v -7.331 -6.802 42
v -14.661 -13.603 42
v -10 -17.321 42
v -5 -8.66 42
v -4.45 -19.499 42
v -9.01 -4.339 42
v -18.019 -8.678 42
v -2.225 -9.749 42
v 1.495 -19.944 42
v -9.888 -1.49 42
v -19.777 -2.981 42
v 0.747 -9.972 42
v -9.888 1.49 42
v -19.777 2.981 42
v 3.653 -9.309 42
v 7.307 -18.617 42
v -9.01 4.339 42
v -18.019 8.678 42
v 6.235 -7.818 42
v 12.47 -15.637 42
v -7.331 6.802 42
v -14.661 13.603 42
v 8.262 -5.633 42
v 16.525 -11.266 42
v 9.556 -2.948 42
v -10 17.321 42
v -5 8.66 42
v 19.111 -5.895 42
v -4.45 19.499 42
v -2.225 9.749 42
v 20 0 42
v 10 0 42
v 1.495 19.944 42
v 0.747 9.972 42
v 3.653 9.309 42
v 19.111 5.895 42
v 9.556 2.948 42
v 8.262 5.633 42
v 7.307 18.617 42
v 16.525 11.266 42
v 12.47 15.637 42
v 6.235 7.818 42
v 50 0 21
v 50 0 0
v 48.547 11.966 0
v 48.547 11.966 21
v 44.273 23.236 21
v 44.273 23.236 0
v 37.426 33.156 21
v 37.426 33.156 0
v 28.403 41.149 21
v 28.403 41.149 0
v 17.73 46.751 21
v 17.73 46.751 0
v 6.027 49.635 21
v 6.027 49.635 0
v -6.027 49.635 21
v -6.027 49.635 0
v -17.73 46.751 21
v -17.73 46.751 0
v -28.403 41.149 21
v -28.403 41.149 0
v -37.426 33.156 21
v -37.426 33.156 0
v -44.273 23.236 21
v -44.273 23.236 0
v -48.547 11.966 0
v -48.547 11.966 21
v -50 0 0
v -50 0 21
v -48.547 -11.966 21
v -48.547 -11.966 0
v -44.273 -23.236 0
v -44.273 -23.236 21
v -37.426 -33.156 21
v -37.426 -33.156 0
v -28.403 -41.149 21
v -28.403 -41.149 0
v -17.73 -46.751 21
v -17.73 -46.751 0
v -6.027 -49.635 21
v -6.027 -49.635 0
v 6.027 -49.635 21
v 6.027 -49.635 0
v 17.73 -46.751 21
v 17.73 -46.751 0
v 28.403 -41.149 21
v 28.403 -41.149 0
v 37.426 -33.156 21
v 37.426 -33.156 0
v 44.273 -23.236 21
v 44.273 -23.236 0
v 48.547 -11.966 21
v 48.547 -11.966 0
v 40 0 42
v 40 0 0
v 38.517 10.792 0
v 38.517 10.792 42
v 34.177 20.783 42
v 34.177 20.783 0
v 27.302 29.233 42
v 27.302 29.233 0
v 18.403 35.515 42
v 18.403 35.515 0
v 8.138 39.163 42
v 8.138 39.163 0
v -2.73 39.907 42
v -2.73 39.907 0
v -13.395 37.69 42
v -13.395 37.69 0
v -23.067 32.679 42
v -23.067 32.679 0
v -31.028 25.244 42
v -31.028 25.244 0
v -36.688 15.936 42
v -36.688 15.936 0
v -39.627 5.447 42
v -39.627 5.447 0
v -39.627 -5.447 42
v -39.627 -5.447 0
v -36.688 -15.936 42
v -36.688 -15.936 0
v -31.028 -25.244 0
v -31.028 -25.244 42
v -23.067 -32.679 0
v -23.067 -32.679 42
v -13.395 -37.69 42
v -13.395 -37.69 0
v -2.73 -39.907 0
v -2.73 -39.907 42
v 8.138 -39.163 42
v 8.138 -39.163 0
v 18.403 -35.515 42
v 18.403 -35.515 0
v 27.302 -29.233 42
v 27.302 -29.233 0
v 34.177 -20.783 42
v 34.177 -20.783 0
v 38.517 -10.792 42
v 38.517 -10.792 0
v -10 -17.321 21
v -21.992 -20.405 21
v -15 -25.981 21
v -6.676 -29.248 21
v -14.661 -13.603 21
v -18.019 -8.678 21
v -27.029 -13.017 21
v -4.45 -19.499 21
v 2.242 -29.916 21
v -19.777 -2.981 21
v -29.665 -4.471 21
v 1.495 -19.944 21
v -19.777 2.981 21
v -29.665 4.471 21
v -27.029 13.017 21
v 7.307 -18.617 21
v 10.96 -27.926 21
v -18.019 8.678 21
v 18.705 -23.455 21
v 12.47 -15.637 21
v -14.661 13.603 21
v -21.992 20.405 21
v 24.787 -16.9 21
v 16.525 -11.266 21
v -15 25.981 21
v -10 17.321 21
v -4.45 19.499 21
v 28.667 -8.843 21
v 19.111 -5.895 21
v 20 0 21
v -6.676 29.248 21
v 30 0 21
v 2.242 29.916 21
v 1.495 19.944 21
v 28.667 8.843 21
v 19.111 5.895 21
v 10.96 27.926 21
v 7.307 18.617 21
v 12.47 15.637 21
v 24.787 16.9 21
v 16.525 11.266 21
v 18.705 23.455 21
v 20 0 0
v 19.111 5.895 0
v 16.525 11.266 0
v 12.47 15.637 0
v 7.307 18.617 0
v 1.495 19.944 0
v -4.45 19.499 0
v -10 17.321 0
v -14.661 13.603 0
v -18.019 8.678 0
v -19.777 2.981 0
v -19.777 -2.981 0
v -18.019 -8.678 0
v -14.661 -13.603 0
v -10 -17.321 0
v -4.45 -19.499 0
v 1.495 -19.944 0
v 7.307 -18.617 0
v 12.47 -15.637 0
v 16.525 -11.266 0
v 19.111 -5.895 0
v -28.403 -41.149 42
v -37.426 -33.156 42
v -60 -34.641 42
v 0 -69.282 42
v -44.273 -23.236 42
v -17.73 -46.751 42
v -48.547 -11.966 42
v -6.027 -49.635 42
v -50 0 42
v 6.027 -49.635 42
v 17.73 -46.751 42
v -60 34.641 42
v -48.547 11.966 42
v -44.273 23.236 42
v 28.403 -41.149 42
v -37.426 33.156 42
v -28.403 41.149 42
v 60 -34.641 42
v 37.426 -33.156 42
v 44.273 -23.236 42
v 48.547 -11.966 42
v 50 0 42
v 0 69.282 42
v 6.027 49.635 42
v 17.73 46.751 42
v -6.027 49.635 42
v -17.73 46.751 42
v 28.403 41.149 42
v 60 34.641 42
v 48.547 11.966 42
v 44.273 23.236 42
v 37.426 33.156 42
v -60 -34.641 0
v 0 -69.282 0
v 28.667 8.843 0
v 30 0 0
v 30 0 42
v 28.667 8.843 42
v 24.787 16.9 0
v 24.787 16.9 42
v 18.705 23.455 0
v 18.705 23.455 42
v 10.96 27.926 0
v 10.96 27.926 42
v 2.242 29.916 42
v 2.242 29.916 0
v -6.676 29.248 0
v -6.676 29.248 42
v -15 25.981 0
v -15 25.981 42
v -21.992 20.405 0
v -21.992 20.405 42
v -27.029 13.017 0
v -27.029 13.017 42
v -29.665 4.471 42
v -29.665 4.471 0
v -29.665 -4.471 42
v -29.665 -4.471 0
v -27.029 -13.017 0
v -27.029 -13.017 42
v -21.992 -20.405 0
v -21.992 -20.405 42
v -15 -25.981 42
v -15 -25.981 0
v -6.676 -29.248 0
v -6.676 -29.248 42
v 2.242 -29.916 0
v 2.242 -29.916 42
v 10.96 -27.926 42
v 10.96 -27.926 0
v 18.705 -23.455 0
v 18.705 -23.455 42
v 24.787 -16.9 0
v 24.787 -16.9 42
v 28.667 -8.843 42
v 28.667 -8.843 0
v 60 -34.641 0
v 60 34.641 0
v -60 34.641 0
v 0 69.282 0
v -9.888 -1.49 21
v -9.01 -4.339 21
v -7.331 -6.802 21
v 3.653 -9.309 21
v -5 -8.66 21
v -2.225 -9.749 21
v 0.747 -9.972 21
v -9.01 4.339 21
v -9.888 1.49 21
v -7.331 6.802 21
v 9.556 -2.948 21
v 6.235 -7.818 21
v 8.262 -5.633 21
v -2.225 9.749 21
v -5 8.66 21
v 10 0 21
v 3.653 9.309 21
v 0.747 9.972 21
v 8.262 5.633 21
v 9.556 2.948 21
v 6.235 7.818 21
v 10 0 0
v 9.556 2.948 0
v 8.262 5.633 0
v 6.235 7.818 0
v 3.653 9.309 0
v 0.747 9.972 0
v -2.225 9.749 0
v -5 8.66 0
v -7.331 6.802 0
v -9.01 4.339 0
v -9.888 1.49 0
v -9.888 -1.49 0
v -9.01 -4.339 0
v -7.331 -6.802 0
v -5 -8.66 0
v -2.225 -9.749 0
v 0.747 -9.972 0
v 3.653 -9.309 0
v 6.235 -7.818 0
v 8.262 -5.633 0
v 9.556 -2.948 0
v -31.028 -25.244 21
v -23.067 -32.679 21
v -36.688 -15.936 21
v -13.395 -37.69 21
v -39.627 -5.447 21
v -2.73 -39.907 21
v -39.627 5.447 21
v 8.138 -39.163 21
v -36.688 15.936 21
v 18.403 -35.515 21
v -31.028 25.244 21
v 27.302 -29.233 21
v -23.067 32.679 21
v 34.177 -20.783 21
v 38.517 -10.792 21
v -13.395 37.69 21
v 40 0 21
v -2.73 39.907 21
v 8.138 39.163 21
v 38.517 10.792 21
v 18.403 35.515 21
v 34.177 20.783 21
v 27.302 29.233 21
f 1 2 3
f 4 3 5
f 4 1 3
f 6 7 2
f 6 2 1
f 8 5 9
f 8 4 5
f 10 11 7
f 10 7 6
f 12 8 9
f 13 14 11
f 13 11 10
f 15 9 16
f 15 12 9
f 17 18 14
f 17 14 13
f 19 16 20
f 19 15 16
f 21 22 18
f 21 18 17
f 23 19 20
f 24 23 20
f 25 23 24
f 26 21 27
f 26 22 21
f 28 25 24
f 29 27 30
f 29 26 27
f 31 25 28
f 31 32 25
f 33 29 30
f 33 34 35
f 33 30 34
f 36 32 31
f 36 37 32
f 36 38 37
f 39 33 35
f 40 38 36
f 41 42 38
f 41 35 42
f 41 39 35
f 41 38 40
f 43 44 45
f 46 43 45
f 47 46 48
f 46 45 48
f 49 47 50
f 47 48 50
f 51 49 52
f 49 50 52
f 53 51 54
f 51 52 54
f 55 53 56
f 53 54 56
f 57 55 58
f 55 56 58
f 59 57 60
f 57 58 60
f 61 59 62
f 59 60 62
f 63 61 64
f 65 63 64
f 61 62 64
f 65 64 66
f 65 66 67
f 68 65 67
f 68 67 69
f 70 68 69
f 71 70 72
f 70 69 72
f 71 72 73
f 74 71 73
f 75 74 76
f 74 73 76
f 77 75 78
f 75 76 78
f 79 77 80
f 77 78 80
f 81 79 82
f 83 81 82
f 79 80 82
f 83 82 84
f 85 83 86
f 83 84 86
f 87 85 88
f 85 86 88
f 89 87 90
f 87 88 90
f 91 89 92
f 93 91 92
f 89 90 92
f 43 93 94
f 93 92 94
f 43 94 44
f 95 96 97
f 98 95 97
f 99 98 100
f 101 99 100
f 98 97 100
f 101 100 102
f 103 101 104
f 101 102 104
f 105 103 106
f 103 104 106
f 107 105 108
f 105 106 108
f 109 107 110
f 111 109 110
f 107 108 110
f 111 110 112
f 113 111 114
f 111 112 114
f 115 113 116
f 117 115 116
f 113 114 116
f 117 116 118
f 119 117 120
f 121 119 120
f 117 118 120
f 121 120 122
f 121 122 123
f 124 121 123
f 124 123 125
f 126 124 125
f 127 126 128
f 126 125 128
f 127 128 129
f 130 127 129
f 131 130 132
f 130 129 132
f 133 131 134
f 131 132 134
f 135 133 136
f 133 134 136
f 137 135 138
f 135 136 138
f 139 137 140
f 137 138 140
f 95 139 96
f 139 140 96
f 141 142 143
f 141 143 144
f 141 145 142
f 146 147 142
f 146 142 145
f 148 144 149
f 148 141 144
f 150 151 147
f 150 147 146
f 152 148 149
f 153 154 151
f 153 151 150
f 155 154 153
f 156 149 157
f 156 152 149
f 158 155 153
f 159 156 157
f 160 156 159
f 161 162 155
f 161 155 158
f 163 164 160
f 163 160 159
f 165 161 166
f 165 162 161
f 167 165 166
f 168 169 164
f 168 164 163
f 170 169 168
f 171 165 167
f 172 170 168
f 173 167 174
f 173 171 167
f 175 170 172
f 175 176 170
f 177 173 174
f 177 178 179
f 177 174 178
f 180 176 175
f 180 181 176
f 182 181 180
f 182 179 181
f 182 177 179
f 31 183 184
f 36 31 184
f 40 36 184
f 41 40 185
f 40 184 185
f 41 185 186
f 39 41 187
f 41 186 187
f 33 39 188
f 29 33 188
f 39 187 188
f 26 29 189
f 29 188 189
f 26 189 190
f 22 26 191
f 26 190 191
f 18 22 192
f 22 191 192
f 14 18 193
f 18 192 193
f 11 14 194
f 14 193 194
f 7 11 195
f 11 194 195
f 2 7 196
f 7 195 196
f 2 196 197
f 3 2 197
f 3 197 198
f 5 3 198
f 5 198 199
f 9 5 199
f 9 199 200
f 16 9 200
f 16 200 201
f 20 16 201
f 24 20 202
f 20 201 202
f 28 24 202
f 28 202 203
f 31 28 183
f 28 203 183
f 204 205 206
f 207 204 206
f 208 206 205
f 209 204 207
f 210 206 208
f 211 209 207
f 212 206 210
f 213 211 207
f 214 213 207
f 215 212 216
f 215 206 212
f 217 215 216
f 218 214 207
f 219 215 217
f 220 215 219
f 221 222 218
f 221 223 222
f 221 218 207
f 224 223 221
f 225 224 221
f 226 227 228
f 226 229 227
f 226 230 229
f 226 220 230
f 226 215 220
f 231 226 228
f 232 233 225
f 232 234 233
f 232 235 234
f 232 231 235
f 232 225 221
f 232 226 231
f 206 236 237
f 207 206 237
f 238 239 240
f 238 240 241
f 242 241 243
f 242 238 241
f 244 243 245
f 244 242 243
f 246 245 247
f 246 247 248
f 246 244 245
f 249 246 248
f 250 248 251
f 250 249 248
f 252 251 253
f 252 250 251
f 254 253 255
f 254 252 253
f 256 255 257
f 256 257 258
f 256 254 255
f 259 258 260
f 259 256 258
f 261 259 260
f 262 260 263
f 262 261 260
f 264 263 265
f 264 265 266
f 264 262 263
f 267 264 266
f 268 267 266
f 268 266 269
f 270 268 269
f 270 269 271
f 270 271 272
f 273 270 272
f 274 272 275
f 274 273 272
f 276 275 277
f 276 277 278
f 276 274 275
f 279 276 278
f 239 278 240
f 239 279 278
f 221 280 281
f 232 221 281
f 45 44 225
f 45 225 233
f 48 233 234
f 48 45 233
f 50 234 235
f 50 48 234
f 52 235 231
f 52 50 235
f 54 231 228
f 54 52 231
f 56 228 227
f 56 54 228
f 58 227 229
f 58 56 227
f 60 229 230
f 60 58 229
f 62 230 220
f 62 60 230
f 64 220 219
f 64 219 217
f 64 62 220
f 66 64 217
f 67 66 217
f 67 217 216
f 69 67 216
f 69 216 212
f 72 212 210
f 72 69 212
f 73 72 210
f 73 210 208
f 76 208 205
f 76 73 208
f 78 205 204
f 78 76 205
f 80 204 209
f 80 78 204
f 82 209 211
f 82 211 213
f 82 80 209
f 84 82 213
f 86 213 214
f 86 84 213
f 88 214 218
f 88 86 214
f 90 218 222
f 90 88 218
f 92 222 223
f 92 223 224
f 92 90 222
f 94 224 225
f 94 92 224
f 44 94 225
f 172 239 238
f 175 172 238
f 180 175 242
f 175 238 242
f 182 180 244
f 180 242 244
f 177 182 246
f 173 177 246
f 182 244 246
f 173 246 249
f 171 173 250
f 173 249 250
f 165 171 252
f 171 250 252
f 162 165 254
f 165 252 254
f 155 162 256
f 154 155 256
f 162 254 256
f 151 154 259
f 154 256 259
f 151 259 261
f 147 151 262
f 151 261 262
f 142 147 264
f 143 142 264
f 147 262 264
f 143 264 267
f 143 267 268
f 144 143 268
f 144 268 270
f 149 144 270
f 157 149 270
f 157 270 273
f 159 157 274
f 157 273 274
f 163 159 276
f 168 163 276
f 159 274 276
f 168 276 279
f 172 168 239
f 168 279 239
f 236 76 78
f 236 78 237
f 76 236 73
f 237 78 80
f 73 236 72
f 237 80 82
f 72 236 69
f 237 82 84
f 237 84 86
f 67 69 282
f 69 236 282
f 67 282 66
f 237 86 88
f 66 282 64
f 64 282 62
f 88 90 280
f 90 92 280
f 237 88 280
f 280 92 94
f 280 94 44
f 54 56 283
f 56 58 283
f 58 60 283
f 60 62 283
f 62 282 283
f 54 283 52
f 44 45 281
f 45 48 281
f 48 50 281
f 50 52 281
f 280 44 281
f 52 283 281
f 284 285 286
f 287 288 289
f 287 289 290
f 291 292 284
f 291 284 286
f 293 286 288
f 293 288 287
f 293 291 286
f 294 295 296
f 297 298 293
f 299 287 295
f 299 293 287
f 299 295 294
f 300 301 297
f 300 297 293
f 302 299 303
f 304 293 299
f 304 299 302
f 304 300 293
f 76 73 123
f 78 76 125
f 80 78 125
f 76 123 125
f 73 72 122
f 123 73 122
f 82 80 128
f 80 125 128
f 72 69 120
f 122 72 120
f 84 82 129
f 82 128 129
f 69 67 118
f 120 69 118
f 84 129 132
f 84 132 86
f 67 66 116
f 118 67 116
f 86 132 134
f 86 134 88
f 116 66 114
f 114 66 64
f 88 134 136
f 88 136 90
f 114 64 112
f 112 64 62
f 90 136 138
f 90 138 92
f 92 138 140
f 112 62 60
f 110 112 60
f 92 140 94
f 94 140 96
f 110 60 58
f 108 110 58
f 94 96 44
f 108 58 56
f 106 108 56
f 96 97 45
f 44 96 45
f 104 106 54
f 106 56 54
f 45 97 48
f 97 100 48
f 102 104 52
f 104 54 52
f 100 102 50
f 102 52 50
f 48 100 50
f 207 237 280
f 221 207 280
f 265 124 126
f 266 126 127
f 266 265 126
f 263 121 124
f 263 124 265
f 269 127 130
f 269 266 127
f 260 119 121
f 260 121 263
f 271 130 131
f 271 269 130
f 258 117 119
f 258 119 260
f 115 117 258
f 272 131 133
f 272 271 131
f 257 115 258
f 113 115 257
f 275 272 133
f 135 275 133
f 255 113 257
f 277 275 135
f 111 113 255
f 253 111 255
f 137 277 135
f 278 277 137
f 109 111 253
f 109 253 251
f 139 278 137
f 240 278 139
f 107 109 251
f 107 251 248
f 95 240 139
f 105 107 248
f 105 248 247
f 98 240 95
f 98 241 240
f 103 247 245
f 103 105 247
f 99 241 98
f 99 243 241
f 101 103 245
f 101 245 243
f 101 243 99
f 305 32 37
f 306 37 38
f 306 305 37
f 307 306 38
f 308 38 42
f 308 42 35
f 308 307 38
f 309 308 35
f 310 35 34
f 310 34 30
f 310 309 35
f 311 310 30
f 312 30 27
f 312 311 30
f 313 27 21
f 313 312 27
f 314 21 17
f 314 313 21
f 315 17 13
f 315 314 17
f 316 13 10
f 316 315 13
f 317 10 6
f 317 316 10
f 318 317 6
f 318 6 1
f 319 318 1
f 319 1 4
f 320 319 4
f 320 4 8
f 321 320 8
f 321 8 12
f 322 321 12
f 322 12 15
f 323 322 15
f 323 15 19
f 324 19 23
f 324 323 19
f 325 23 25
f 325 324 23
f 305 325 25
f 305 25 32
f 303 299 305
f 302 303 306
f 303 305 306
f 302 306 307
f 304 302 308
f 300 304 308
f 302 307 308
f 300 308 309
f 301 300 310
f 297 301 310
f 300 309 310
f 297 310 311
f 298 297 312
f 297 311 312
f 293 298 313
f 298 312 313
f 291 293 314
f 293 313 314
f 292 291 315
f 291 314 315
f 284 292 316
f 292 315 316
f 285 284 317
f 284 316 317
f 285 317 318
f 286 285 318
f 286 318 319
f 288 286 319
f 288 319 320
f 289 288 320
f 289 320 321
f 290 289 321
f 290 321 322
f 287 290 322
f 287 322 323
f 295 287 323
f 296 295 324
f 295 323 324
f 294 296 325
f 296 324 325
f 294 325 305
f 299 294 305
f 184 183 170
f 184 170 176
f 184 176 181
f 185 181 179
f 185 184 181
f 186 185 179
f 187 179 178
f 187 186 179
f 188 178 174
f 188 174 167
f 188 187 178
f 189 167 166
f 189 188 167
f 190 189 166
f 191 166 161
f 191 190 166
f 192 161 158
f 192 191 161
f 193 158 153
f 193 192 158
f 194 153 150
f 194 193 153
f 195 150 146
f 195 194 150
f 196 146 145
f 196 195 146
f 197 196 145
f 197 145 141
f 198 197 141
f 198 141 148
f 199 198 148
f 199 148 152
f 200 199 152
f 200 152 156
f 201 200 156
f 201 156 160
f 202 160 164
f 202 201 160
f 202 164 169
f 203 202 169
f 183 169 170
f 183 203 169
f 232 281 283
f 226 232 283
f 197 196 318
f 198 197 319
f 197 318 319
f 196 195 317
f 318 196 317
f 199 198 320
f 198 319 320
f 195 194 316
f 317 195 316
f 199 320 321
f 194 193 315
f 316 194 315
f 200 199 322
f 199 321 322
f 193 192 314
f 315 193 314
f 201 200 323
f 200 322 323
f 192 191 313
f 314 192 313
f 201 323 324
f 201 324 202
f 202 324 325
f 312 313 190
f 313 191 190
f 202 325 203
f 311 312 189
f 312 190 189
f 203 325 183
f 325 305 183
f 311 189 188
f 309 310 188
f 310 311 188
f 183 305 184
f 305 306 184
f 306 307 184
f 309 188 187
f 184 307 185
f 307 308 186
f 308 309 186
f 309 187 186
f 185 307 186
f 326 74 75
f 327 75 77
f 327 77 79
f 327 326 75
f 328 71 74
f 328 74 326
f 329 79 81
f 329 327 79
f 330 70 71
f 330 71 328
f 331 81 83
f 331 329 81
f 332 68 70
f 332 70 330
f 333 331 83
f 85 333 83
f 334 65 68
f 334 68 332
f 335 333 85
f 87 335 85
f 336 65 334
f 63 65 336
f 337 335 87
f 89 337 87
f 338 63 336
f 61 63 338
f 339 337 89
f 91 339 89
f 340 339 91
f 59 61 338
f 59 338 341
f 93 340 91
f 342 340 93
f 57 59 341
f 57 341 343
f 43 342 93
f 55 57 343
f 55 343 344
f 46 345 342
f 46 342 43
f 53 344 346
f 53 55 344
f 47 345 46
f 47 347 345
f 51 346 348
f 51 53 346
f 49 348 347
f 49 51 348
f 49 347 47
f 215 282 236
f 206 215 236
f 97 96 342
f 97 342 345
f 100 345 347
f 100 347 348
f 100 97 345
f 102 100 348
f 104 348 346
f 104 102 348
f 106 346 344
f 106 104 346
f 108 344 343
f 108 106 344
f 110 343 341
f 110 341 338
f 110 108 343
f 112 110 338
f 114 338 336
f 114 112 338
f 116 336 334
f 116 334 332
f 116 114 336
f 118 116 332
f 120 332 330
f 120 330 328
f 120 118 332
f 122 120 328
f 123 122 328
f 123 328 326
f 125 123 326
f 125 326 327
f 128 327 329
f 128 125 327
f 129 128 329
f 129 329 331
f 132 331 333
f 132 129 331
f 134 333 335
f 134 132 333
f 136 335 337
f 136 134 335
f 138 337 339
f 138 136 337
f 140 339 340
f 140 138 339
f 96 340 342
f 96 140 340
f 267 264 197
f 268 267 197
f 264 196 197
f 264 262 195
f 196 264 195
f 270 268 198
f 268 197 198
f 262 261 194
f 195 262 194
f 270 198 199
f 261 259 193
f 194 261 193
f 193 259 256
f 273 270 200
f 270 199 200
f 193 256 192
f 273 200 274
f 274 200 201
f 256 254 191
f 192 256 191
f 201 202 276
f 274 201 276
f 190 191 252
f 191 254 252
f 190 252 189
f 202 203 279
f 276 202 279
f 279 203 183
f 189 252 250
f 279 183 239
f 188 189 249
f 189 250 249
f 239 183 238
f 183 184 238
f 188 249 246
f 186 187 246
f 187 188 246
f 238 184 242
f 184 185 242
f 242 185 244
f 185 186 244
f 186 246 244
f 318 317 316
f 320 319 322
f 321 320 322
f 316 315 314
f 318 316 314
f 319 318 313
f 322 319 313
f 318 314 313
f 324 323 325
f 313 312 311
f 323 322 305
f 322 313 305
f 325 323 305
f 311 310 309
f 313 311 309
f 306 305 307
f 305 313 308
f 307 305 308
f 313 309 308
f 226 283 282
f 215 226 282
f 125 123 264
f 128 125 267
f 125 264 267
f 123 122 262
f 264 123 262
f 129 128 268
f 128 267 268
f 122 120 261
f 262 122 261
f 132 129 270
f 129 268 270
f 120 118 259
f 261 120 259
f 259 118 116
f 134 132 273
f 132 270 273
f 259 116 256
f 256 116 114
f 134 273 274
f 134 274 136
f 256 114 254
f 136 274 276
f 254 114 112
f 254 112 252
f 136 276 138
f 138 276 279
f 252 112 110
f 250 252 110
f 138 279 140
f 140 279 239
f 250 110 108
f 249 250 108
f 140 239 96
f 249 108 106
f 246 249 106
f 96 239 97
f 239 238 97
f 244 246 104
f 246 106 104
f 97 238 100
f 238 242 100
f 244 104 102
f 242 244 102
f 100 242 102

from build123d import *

# Parameters (mm, degrees)
F0_R     = 50
F0_R_2   = 40
F0_R_3   = 30
F0_R_4   = 20
F0_R_5   = 10
F1_DEPTH = 42
F2_DEPTH = 21


with BuildPart() as f1:
    # F0 (on Top) → F1 (new body)
    with BuildSketch(Plane.XY):
        Polygon((60, -34.641016), (60, 34.641016), (0, 69.282032), (-60, 34.641016), (-60, -34.641016), (0, -69.282032), align=None)
        Circle(F0_R, mode=Mode.SUBTRACT)
        Circle(F0_R_2)
        Circle(F0_R_3, mode=Mode.SUBTRACT)
        Circle(F0_R_4)
        Circle(F0_R_5, mode=Mode.SUBTRACT)
    extrude(amount=F1_DEPTH)


with BuildPart() as f2:
    # F0 (on Top) → F2 (new body)
    with BuildSketch(Plane.XY):
        Circle(F0_R)
        Circle(F0_R_2, mode=Mode.SUBTRACT)
        Circle(F0_R_3)
        Circle(F0_R_4, mode=Mode.SUBTRACT)
        Circle(F0_R_5)
    extrude(amount=F2_DEPTH)


solid = Compound([f1.part, f2.part])
